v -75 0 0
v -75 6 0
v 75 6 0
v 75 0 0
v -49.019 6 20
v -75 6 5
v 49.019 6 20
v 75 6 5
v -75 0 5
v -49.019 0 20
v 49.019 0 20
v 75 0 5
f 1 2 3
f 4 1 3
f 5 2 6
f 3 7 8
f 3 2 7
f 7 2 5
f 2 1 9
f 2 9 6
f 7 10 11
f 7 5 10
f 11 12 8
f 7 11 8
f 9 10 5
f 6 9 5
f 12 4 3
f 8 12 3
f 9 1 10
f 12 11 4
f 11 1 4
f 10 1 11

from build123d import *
from OCP.BRepFilletAPI import BRepFilletAPI_MakeChamfer

# Parameters (mm, degrees)
SKETCH_1_W      = 150
SKETCH_1_H      = 6
EXTRUDE_1_DEPTH = 20
CHAMFER_1_SIZE  = 15
CHAMFER_1_SIZE2 = 25.980762114


with BuildPart() as part:
    # Эскиз1 → Бобышка-Вытянуть1 (new body)
    with BuildSketch(Plane.XY):
        with Locations((0, 3)):
            Rectangle(SKETCH_1_W, SKETCH_1_H)
    extrude(amount=EXTRUDE_1_DEPTH)

    # Фаска1: one chamfer whose edges measure the first distance from different faces: ONE call of the kernel's chamfer builder (chamfer() names one face for all edges)
    chamfer_1_edges_1 = [part.edges().sort_by_distance(p)[0] for p in [
        (75, 3, 20),
    ]]
    chamfer_1_side_1 = [part.faces().sort_by_distance(p)[0] for p in [
        (75, 3, 10),
    ]]
    chamfer_1_edges_2 = [part.edges().sort_by_distance(p)[0] for p in [
        (-75, 3, 20),
    ]]
    chamfer_1_side_2 = [part.faces().sort_by_distance(p)[0] for p in [
        (-75, 3, 10),
    ]]
    chamfer_1 = BRepFilletAPI_MakeChamfer(part.part.solid().wrapped)
    for e in chamfer_1_edges_1:
        chamfer_1.Add(CHAMFER_1_SIZE, CHAMFER_1_SIZE2, e.wrapped, chamfer_1_side_1[0].wrapped)  # the first distance lies on this face
    for e in chamfer_1_edges_2:
        chamfer_1.Add(CHAMFER_1_SIZE, CHAMFER_1_SIZE2, e.wrapped, chamfer_1_side_2[0].wrapped)  # the first distance lies on this face
    add(Compound.cast(chamfer_1.Shape()), mode=Mode.REPLACE)


solid = part.part
